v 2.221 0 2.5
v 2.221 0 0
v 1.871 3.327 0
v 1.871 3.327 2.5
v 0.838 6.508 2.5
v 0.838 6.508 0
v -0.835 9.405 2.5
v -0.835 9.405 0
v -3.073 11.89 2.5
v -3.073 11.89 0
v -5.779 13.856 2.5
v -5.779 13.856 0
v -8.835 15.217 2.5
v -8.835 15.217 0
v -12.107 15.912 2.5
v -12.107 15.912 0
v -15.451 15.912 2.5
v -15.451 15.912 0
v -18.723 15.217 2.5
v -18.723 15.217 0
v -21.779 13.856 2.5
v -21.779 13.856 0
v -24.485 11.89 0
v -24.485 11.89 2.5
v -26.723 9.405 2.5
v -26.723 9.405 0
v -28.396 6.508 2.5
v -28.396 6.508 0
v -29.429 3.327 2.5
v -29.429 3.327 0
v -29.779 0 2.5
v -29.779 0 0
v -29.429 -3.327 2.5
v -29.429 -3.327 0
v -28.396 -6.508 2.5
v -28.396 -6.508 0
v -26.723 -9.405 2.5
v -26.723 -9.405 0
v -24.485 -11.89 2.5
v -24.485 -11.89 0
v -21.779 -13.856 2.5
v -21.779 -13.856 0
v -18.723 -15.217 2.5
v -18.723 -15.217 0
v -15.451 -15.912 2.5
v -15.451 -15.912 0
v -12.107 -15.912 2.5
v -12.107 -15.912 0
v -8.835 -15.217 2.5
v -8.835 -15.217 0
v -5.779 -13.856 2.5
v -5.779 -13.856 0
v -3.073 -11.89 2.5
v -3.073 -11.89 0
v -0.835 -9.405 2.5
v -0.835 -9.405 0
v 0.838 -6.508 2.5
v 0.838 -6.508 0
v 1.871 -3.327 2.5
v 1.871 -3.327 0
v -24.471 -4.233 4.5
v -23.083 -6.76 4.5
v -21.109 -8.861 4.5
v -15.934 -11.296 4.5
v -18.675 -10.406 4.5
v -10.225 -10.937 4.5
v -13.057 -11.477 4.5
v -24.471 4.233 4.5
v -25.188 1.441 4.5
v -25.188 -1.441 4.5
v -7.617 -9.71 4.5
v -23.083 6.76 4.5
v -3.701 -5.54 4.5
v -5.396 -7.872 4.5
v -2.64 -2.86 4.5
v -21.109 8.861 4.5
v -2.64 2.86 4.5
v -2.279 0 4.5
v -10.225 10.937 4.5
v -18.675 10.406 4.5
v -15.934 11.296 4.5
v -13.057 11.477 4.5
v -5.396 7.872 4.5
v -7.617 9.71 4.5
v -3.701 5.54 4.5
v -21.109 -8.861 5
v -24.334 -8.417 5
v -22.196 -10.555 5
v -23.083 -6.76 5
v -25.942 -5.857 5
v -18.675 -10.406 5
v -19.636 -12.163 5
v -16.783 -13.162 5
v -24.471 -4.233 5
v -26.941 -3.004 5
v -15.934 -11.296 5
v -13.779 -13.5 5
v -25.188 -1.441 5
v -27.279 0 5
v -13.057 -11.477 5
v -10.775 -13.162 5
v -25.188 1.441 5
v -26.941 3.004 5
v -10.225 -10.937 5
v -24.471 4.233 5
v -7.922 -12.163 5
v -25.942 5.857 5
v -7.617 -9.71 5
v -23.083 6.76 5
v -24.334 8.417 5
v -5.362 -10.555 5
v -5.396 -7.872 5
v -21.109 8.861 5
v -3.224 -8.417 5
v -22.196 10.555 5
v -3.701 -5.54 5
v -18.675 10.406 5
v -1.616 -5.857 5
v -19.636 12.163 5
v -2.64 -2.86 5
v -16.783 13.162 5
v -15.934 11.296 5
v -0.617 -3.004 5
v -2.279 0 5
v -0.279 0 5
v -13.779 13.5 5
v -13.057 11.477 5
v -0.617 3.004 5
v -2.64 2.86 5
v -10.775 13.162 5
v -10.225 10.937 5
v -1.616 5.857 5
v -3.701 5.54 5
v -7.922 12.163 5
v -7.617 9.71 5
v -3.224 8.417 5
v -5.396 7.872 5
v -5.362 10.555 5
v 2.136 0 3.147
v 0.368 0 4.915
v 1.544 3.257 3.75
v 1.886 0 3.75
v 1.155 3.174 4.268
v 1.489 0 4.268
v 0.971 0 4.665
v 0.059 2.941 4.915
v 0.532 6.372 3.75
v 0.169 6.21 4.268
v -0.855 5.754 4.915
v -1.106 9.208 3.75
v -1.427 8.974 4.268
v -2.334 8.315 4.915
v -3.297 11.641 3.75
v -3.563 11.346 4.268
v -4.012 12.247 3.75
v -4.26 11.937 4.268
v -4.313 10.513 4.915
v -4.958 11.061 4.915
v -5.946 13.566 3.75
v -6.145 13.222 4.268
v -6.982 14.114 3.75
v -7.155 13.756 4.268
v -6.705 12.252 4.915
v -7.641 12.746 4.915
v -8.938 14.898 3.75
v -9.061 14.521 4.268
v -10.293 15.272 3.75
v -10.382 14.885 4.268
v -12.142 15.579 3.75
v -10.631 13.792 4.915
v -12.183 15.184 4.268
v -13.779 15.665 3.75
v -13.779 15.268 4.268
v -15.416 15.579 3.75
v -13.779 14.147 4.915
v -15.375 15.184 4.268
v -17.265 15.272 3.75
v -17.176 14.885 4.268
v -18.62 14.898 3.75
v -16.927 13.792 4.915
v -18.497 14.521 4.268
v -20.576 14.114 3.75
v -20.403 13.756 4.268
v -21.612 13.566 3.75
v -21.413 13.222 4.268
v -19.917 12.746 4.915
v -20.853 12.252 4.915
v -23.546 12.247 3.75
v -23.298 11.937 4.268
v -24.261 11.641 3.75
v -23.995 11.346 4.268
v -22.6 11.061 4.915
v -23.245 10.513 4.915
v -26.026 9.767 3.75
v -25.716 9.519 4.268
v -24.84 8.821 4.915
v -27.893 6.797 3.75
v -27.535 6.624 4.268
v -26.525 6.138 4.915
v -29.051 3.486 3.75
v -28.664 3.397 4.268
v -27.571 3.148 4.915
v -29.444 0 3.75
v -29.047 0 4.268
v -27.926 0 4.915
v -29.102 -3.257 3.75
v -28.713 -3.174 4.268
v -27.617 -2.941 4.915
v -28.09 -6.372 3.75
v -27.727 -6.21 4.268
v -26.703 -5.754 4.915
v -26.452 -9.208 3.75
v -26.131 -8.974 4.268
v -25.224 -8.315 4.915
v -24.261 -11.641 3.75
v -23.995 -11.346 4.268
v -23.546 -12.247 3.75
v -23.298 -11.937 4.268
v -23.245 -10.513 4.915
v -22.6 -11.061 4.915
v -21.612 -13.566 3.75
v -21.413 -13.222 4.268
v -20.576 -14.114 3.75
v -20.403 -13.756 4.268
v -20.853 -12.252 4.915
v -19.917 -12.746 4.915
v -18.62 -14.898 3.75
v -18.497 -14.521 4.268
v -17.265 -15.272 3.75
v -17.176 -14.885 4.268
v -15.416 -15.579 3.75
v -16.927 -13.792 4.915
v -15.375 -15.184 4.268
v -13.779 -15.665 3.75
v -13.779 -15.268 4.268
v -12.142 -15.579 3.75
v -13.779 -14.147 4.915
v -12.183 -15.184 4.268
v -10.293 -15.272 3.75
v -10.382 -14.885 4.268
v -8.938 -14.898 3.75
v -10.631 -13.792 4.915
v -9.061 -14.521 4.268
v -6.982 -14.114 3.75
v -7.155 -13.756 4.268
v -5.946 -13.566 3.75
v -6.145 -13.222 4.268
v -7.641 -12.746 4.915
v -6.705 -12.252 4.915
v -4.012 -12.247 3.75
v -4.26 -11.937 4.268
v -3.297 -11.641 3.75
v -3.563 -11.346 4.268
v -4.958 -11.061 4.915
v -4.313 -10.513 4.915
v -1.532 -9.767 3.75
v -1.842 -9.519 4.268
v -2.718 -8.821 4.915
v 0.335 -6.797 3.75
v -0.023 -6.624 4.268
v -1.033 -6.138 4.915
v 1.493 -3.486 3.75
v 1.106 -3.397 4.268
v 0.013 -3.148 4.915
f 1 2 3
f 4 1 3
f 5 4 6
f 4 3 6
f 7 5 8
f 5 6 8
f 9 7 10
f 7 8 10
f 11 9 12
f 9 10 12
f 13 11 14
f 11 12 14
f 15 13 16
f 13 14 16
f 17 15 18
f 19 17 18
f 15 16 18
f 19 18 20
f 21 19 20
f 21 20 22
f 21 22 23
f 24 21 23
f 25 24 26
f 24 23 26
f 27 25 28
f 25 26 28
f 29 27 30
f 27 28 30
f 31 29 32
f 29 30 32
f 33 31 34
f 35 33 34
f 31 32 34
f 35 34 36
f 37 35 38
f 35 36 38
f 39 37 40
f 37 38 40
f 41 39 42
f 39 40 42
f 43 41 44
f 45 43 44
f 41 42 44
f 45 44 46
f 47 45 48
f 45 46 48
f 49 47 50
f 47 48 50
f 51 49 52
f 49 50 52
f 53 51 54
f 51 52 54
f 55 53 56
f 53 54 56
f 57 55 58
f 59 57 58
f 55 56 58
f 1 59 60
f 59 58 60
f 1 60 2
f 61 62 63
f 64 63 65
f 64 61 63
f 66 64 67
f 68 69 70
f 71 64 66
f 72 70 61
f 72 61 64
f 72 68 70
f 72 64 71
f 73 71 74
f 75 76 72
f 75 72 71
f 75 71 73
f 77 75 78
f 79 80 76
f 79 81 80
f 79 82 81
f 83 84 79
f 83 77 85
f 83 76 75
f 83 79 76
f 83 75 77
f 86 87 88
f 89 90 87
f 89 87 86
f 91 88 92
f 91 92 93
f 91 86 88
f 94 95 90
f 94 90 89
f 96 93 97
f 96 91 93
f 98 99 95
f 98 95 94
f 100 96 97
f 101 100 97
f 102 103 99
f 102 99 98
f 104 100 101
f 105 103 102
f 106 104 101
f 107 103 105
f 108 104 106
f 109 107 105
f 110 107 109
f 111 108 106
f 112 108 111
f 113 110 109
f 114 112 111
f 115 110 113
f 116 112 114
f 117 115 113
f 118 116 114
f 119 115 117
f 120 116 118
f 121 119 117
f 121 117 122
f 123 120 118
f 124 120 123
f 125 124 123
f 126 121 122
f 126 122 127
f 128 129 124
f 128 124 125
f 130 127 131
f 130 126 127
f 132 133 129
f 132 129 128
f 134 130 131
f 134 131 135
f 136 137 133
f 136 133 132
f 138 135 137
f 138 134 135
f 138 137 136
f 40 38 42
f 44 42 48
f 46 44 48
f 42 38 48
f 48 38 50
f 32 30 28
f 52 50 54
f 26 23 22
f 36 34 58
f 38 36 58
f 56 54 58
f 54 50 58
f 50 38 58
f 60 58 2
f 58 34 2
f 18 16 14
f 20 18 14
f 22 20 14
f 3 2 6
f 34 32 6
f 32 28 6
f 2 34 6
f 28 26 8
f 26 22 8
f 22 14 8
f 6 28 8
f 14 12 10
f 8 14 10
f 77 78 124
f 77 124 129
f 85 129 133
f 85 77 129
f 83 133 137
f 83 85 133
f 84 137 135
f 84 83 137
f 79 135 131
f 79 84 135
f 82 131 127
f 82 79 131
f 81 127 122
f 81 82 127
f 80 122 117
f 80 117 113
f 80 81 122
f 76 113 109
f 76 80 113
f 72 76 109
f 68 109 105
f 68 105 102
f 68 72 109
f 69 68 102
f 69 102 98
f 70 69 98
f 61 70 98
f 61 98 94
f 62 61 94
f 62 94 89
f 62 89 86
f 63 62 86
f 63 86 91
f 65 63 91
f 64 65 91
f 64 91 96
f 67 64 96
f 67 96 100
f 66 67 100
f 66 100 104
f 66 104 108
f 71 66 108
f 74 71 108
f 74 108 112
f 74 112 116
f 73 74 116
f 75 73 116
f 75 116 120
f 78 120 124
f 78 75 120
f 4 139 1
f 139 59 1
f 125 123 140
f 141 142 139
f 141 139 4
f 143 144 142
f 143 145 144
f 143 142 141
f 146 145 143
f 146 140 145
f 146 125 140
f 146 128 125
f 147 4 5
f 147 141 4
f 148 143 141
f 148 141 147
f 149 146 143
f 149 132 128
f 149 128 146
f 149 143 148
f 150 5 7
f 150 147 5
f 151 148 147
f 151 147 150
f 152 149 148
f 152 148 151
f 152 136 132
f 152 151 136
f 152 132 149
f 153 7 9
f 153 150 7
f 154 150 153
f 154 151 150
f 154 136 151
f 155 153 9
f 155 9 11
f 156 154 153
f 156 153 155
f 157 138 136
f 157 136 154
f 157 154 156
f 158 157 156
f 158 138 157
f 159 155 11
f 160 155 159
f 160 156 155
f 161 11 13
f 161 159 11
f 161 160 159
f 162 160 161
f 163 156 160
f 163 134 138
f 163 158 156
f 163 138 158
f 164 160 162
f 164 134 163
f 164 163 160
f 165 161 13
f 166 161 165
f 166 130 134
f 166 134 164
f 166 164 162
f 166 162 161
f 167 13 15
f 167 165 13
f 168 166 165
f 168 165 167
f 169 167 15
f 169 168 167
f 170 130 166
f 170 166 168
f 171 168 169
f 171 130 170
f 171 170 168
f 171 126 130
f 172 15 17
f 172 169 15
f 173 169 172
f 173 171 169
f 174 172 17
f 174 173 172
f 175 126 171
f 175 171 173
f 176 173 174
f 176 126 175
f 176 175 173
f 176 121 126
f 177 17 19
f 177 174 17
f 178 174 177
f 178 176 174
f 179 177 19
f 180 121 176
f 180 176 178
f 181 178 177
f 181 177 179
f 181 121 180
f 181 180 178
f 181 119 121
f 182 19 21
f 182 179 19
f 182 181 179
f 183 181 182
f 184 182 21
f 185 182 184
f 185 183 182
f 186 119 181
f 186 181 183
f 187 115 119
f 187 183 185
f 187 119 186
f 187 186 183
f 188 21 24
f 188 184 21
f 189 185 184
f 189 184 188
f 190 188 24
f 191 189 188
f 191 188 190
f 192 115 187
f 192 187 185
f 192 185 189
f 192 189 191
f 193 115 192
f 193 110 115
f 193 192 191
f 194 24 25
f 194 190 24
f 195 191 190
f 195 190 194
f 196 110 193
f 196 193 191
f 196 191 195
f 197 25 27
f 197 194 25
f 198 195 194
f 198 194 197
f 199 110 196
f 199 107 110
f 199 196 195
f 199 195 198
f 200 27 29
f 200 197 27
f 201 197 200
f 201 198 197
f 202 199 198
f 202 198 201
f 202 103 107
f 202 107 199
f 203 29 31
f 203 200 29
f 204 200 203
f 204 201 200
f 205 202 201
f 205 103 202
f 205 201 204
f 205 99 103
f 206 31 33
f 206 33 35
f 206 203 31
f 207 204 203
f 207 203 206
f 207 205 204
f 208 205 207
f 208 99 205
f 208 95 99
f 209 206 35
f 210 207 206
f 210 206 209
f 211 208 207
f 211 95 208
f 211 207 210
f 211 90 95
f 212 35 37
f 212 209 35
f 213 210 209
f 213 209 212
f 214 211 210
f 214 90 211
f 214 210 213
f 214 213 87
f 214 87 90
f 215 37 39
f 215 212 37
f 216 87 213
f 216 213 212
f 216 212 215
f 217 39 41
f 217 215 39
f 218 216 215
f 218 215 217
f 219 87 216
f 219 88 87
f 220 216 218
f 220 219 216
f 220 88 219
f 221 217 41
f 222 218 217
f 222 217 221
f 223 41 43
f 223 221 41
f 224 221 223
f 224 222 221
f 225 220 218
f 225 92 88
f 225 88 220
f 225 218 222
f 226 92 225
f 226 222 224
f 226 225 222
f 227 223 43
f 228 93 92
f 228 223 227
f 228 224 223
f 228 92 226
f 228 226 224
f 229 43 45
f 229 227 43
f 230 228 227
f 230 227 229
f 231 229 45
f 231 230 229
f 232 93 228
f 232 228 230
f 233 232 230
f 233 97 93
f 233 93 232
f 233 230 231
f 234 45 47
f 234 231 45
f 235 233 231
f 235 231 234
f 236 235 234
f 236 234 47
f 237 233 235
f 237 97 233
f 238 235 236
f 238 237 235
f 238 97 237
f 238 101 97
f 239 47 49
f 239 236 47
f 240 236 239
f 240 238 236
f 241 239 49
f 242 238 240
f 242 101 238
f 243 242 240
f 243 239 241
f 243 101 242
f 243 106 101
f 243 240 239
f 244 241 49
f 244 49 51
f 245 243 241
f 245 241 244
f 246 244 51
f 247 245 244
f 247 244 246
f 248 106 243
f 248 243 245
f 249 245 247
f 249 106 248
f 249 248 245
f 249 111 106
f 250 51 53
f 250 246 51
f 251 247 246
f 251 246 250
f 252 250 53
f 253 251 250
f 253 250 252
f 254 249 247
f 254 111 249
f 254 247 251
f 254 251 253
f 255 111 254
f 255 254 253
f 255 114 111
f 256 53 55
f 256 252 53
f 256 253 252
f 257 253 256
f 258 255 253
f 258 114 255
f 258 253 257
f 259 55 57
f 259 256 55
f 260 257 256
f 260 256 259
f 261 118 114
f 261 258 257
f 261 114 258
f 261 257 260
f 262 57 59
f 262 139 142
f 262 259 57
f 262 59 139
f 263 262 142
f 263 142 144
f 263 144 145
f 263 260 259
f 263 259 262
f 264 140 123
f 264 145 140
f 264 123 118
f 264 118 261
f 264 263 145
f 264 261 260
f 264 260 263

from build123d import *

# Parameters (mm, degrees)
F0_R     = 16
F1_DEPTH = 5
F2_T     = -4.5
F3_R     = 2.5


with BuildPart() as f1:
    # F0 (on Top) → F1 (new body)
    with BuildSketch(Plane.XY):
        with Locations((-13.779012, 0)):
            Circle(F0_R)
    extrude(amount=F1_DEPTH)

    # F2
    f2_openings = [f1.faces().sort_by_distance(p)[0] for p in [
        (-13.779012, 0, 5),
    ]]
    offset(amount=F2_T, openings=f2_openings)

    # F3
    f3_edges = [f1.edges().sort_by_distance(p)[0] for p in [
        (-29.779012, 0, 5),
    ]]
    fillet(f3_edges, radius=F3_R)


solid = f1.part
